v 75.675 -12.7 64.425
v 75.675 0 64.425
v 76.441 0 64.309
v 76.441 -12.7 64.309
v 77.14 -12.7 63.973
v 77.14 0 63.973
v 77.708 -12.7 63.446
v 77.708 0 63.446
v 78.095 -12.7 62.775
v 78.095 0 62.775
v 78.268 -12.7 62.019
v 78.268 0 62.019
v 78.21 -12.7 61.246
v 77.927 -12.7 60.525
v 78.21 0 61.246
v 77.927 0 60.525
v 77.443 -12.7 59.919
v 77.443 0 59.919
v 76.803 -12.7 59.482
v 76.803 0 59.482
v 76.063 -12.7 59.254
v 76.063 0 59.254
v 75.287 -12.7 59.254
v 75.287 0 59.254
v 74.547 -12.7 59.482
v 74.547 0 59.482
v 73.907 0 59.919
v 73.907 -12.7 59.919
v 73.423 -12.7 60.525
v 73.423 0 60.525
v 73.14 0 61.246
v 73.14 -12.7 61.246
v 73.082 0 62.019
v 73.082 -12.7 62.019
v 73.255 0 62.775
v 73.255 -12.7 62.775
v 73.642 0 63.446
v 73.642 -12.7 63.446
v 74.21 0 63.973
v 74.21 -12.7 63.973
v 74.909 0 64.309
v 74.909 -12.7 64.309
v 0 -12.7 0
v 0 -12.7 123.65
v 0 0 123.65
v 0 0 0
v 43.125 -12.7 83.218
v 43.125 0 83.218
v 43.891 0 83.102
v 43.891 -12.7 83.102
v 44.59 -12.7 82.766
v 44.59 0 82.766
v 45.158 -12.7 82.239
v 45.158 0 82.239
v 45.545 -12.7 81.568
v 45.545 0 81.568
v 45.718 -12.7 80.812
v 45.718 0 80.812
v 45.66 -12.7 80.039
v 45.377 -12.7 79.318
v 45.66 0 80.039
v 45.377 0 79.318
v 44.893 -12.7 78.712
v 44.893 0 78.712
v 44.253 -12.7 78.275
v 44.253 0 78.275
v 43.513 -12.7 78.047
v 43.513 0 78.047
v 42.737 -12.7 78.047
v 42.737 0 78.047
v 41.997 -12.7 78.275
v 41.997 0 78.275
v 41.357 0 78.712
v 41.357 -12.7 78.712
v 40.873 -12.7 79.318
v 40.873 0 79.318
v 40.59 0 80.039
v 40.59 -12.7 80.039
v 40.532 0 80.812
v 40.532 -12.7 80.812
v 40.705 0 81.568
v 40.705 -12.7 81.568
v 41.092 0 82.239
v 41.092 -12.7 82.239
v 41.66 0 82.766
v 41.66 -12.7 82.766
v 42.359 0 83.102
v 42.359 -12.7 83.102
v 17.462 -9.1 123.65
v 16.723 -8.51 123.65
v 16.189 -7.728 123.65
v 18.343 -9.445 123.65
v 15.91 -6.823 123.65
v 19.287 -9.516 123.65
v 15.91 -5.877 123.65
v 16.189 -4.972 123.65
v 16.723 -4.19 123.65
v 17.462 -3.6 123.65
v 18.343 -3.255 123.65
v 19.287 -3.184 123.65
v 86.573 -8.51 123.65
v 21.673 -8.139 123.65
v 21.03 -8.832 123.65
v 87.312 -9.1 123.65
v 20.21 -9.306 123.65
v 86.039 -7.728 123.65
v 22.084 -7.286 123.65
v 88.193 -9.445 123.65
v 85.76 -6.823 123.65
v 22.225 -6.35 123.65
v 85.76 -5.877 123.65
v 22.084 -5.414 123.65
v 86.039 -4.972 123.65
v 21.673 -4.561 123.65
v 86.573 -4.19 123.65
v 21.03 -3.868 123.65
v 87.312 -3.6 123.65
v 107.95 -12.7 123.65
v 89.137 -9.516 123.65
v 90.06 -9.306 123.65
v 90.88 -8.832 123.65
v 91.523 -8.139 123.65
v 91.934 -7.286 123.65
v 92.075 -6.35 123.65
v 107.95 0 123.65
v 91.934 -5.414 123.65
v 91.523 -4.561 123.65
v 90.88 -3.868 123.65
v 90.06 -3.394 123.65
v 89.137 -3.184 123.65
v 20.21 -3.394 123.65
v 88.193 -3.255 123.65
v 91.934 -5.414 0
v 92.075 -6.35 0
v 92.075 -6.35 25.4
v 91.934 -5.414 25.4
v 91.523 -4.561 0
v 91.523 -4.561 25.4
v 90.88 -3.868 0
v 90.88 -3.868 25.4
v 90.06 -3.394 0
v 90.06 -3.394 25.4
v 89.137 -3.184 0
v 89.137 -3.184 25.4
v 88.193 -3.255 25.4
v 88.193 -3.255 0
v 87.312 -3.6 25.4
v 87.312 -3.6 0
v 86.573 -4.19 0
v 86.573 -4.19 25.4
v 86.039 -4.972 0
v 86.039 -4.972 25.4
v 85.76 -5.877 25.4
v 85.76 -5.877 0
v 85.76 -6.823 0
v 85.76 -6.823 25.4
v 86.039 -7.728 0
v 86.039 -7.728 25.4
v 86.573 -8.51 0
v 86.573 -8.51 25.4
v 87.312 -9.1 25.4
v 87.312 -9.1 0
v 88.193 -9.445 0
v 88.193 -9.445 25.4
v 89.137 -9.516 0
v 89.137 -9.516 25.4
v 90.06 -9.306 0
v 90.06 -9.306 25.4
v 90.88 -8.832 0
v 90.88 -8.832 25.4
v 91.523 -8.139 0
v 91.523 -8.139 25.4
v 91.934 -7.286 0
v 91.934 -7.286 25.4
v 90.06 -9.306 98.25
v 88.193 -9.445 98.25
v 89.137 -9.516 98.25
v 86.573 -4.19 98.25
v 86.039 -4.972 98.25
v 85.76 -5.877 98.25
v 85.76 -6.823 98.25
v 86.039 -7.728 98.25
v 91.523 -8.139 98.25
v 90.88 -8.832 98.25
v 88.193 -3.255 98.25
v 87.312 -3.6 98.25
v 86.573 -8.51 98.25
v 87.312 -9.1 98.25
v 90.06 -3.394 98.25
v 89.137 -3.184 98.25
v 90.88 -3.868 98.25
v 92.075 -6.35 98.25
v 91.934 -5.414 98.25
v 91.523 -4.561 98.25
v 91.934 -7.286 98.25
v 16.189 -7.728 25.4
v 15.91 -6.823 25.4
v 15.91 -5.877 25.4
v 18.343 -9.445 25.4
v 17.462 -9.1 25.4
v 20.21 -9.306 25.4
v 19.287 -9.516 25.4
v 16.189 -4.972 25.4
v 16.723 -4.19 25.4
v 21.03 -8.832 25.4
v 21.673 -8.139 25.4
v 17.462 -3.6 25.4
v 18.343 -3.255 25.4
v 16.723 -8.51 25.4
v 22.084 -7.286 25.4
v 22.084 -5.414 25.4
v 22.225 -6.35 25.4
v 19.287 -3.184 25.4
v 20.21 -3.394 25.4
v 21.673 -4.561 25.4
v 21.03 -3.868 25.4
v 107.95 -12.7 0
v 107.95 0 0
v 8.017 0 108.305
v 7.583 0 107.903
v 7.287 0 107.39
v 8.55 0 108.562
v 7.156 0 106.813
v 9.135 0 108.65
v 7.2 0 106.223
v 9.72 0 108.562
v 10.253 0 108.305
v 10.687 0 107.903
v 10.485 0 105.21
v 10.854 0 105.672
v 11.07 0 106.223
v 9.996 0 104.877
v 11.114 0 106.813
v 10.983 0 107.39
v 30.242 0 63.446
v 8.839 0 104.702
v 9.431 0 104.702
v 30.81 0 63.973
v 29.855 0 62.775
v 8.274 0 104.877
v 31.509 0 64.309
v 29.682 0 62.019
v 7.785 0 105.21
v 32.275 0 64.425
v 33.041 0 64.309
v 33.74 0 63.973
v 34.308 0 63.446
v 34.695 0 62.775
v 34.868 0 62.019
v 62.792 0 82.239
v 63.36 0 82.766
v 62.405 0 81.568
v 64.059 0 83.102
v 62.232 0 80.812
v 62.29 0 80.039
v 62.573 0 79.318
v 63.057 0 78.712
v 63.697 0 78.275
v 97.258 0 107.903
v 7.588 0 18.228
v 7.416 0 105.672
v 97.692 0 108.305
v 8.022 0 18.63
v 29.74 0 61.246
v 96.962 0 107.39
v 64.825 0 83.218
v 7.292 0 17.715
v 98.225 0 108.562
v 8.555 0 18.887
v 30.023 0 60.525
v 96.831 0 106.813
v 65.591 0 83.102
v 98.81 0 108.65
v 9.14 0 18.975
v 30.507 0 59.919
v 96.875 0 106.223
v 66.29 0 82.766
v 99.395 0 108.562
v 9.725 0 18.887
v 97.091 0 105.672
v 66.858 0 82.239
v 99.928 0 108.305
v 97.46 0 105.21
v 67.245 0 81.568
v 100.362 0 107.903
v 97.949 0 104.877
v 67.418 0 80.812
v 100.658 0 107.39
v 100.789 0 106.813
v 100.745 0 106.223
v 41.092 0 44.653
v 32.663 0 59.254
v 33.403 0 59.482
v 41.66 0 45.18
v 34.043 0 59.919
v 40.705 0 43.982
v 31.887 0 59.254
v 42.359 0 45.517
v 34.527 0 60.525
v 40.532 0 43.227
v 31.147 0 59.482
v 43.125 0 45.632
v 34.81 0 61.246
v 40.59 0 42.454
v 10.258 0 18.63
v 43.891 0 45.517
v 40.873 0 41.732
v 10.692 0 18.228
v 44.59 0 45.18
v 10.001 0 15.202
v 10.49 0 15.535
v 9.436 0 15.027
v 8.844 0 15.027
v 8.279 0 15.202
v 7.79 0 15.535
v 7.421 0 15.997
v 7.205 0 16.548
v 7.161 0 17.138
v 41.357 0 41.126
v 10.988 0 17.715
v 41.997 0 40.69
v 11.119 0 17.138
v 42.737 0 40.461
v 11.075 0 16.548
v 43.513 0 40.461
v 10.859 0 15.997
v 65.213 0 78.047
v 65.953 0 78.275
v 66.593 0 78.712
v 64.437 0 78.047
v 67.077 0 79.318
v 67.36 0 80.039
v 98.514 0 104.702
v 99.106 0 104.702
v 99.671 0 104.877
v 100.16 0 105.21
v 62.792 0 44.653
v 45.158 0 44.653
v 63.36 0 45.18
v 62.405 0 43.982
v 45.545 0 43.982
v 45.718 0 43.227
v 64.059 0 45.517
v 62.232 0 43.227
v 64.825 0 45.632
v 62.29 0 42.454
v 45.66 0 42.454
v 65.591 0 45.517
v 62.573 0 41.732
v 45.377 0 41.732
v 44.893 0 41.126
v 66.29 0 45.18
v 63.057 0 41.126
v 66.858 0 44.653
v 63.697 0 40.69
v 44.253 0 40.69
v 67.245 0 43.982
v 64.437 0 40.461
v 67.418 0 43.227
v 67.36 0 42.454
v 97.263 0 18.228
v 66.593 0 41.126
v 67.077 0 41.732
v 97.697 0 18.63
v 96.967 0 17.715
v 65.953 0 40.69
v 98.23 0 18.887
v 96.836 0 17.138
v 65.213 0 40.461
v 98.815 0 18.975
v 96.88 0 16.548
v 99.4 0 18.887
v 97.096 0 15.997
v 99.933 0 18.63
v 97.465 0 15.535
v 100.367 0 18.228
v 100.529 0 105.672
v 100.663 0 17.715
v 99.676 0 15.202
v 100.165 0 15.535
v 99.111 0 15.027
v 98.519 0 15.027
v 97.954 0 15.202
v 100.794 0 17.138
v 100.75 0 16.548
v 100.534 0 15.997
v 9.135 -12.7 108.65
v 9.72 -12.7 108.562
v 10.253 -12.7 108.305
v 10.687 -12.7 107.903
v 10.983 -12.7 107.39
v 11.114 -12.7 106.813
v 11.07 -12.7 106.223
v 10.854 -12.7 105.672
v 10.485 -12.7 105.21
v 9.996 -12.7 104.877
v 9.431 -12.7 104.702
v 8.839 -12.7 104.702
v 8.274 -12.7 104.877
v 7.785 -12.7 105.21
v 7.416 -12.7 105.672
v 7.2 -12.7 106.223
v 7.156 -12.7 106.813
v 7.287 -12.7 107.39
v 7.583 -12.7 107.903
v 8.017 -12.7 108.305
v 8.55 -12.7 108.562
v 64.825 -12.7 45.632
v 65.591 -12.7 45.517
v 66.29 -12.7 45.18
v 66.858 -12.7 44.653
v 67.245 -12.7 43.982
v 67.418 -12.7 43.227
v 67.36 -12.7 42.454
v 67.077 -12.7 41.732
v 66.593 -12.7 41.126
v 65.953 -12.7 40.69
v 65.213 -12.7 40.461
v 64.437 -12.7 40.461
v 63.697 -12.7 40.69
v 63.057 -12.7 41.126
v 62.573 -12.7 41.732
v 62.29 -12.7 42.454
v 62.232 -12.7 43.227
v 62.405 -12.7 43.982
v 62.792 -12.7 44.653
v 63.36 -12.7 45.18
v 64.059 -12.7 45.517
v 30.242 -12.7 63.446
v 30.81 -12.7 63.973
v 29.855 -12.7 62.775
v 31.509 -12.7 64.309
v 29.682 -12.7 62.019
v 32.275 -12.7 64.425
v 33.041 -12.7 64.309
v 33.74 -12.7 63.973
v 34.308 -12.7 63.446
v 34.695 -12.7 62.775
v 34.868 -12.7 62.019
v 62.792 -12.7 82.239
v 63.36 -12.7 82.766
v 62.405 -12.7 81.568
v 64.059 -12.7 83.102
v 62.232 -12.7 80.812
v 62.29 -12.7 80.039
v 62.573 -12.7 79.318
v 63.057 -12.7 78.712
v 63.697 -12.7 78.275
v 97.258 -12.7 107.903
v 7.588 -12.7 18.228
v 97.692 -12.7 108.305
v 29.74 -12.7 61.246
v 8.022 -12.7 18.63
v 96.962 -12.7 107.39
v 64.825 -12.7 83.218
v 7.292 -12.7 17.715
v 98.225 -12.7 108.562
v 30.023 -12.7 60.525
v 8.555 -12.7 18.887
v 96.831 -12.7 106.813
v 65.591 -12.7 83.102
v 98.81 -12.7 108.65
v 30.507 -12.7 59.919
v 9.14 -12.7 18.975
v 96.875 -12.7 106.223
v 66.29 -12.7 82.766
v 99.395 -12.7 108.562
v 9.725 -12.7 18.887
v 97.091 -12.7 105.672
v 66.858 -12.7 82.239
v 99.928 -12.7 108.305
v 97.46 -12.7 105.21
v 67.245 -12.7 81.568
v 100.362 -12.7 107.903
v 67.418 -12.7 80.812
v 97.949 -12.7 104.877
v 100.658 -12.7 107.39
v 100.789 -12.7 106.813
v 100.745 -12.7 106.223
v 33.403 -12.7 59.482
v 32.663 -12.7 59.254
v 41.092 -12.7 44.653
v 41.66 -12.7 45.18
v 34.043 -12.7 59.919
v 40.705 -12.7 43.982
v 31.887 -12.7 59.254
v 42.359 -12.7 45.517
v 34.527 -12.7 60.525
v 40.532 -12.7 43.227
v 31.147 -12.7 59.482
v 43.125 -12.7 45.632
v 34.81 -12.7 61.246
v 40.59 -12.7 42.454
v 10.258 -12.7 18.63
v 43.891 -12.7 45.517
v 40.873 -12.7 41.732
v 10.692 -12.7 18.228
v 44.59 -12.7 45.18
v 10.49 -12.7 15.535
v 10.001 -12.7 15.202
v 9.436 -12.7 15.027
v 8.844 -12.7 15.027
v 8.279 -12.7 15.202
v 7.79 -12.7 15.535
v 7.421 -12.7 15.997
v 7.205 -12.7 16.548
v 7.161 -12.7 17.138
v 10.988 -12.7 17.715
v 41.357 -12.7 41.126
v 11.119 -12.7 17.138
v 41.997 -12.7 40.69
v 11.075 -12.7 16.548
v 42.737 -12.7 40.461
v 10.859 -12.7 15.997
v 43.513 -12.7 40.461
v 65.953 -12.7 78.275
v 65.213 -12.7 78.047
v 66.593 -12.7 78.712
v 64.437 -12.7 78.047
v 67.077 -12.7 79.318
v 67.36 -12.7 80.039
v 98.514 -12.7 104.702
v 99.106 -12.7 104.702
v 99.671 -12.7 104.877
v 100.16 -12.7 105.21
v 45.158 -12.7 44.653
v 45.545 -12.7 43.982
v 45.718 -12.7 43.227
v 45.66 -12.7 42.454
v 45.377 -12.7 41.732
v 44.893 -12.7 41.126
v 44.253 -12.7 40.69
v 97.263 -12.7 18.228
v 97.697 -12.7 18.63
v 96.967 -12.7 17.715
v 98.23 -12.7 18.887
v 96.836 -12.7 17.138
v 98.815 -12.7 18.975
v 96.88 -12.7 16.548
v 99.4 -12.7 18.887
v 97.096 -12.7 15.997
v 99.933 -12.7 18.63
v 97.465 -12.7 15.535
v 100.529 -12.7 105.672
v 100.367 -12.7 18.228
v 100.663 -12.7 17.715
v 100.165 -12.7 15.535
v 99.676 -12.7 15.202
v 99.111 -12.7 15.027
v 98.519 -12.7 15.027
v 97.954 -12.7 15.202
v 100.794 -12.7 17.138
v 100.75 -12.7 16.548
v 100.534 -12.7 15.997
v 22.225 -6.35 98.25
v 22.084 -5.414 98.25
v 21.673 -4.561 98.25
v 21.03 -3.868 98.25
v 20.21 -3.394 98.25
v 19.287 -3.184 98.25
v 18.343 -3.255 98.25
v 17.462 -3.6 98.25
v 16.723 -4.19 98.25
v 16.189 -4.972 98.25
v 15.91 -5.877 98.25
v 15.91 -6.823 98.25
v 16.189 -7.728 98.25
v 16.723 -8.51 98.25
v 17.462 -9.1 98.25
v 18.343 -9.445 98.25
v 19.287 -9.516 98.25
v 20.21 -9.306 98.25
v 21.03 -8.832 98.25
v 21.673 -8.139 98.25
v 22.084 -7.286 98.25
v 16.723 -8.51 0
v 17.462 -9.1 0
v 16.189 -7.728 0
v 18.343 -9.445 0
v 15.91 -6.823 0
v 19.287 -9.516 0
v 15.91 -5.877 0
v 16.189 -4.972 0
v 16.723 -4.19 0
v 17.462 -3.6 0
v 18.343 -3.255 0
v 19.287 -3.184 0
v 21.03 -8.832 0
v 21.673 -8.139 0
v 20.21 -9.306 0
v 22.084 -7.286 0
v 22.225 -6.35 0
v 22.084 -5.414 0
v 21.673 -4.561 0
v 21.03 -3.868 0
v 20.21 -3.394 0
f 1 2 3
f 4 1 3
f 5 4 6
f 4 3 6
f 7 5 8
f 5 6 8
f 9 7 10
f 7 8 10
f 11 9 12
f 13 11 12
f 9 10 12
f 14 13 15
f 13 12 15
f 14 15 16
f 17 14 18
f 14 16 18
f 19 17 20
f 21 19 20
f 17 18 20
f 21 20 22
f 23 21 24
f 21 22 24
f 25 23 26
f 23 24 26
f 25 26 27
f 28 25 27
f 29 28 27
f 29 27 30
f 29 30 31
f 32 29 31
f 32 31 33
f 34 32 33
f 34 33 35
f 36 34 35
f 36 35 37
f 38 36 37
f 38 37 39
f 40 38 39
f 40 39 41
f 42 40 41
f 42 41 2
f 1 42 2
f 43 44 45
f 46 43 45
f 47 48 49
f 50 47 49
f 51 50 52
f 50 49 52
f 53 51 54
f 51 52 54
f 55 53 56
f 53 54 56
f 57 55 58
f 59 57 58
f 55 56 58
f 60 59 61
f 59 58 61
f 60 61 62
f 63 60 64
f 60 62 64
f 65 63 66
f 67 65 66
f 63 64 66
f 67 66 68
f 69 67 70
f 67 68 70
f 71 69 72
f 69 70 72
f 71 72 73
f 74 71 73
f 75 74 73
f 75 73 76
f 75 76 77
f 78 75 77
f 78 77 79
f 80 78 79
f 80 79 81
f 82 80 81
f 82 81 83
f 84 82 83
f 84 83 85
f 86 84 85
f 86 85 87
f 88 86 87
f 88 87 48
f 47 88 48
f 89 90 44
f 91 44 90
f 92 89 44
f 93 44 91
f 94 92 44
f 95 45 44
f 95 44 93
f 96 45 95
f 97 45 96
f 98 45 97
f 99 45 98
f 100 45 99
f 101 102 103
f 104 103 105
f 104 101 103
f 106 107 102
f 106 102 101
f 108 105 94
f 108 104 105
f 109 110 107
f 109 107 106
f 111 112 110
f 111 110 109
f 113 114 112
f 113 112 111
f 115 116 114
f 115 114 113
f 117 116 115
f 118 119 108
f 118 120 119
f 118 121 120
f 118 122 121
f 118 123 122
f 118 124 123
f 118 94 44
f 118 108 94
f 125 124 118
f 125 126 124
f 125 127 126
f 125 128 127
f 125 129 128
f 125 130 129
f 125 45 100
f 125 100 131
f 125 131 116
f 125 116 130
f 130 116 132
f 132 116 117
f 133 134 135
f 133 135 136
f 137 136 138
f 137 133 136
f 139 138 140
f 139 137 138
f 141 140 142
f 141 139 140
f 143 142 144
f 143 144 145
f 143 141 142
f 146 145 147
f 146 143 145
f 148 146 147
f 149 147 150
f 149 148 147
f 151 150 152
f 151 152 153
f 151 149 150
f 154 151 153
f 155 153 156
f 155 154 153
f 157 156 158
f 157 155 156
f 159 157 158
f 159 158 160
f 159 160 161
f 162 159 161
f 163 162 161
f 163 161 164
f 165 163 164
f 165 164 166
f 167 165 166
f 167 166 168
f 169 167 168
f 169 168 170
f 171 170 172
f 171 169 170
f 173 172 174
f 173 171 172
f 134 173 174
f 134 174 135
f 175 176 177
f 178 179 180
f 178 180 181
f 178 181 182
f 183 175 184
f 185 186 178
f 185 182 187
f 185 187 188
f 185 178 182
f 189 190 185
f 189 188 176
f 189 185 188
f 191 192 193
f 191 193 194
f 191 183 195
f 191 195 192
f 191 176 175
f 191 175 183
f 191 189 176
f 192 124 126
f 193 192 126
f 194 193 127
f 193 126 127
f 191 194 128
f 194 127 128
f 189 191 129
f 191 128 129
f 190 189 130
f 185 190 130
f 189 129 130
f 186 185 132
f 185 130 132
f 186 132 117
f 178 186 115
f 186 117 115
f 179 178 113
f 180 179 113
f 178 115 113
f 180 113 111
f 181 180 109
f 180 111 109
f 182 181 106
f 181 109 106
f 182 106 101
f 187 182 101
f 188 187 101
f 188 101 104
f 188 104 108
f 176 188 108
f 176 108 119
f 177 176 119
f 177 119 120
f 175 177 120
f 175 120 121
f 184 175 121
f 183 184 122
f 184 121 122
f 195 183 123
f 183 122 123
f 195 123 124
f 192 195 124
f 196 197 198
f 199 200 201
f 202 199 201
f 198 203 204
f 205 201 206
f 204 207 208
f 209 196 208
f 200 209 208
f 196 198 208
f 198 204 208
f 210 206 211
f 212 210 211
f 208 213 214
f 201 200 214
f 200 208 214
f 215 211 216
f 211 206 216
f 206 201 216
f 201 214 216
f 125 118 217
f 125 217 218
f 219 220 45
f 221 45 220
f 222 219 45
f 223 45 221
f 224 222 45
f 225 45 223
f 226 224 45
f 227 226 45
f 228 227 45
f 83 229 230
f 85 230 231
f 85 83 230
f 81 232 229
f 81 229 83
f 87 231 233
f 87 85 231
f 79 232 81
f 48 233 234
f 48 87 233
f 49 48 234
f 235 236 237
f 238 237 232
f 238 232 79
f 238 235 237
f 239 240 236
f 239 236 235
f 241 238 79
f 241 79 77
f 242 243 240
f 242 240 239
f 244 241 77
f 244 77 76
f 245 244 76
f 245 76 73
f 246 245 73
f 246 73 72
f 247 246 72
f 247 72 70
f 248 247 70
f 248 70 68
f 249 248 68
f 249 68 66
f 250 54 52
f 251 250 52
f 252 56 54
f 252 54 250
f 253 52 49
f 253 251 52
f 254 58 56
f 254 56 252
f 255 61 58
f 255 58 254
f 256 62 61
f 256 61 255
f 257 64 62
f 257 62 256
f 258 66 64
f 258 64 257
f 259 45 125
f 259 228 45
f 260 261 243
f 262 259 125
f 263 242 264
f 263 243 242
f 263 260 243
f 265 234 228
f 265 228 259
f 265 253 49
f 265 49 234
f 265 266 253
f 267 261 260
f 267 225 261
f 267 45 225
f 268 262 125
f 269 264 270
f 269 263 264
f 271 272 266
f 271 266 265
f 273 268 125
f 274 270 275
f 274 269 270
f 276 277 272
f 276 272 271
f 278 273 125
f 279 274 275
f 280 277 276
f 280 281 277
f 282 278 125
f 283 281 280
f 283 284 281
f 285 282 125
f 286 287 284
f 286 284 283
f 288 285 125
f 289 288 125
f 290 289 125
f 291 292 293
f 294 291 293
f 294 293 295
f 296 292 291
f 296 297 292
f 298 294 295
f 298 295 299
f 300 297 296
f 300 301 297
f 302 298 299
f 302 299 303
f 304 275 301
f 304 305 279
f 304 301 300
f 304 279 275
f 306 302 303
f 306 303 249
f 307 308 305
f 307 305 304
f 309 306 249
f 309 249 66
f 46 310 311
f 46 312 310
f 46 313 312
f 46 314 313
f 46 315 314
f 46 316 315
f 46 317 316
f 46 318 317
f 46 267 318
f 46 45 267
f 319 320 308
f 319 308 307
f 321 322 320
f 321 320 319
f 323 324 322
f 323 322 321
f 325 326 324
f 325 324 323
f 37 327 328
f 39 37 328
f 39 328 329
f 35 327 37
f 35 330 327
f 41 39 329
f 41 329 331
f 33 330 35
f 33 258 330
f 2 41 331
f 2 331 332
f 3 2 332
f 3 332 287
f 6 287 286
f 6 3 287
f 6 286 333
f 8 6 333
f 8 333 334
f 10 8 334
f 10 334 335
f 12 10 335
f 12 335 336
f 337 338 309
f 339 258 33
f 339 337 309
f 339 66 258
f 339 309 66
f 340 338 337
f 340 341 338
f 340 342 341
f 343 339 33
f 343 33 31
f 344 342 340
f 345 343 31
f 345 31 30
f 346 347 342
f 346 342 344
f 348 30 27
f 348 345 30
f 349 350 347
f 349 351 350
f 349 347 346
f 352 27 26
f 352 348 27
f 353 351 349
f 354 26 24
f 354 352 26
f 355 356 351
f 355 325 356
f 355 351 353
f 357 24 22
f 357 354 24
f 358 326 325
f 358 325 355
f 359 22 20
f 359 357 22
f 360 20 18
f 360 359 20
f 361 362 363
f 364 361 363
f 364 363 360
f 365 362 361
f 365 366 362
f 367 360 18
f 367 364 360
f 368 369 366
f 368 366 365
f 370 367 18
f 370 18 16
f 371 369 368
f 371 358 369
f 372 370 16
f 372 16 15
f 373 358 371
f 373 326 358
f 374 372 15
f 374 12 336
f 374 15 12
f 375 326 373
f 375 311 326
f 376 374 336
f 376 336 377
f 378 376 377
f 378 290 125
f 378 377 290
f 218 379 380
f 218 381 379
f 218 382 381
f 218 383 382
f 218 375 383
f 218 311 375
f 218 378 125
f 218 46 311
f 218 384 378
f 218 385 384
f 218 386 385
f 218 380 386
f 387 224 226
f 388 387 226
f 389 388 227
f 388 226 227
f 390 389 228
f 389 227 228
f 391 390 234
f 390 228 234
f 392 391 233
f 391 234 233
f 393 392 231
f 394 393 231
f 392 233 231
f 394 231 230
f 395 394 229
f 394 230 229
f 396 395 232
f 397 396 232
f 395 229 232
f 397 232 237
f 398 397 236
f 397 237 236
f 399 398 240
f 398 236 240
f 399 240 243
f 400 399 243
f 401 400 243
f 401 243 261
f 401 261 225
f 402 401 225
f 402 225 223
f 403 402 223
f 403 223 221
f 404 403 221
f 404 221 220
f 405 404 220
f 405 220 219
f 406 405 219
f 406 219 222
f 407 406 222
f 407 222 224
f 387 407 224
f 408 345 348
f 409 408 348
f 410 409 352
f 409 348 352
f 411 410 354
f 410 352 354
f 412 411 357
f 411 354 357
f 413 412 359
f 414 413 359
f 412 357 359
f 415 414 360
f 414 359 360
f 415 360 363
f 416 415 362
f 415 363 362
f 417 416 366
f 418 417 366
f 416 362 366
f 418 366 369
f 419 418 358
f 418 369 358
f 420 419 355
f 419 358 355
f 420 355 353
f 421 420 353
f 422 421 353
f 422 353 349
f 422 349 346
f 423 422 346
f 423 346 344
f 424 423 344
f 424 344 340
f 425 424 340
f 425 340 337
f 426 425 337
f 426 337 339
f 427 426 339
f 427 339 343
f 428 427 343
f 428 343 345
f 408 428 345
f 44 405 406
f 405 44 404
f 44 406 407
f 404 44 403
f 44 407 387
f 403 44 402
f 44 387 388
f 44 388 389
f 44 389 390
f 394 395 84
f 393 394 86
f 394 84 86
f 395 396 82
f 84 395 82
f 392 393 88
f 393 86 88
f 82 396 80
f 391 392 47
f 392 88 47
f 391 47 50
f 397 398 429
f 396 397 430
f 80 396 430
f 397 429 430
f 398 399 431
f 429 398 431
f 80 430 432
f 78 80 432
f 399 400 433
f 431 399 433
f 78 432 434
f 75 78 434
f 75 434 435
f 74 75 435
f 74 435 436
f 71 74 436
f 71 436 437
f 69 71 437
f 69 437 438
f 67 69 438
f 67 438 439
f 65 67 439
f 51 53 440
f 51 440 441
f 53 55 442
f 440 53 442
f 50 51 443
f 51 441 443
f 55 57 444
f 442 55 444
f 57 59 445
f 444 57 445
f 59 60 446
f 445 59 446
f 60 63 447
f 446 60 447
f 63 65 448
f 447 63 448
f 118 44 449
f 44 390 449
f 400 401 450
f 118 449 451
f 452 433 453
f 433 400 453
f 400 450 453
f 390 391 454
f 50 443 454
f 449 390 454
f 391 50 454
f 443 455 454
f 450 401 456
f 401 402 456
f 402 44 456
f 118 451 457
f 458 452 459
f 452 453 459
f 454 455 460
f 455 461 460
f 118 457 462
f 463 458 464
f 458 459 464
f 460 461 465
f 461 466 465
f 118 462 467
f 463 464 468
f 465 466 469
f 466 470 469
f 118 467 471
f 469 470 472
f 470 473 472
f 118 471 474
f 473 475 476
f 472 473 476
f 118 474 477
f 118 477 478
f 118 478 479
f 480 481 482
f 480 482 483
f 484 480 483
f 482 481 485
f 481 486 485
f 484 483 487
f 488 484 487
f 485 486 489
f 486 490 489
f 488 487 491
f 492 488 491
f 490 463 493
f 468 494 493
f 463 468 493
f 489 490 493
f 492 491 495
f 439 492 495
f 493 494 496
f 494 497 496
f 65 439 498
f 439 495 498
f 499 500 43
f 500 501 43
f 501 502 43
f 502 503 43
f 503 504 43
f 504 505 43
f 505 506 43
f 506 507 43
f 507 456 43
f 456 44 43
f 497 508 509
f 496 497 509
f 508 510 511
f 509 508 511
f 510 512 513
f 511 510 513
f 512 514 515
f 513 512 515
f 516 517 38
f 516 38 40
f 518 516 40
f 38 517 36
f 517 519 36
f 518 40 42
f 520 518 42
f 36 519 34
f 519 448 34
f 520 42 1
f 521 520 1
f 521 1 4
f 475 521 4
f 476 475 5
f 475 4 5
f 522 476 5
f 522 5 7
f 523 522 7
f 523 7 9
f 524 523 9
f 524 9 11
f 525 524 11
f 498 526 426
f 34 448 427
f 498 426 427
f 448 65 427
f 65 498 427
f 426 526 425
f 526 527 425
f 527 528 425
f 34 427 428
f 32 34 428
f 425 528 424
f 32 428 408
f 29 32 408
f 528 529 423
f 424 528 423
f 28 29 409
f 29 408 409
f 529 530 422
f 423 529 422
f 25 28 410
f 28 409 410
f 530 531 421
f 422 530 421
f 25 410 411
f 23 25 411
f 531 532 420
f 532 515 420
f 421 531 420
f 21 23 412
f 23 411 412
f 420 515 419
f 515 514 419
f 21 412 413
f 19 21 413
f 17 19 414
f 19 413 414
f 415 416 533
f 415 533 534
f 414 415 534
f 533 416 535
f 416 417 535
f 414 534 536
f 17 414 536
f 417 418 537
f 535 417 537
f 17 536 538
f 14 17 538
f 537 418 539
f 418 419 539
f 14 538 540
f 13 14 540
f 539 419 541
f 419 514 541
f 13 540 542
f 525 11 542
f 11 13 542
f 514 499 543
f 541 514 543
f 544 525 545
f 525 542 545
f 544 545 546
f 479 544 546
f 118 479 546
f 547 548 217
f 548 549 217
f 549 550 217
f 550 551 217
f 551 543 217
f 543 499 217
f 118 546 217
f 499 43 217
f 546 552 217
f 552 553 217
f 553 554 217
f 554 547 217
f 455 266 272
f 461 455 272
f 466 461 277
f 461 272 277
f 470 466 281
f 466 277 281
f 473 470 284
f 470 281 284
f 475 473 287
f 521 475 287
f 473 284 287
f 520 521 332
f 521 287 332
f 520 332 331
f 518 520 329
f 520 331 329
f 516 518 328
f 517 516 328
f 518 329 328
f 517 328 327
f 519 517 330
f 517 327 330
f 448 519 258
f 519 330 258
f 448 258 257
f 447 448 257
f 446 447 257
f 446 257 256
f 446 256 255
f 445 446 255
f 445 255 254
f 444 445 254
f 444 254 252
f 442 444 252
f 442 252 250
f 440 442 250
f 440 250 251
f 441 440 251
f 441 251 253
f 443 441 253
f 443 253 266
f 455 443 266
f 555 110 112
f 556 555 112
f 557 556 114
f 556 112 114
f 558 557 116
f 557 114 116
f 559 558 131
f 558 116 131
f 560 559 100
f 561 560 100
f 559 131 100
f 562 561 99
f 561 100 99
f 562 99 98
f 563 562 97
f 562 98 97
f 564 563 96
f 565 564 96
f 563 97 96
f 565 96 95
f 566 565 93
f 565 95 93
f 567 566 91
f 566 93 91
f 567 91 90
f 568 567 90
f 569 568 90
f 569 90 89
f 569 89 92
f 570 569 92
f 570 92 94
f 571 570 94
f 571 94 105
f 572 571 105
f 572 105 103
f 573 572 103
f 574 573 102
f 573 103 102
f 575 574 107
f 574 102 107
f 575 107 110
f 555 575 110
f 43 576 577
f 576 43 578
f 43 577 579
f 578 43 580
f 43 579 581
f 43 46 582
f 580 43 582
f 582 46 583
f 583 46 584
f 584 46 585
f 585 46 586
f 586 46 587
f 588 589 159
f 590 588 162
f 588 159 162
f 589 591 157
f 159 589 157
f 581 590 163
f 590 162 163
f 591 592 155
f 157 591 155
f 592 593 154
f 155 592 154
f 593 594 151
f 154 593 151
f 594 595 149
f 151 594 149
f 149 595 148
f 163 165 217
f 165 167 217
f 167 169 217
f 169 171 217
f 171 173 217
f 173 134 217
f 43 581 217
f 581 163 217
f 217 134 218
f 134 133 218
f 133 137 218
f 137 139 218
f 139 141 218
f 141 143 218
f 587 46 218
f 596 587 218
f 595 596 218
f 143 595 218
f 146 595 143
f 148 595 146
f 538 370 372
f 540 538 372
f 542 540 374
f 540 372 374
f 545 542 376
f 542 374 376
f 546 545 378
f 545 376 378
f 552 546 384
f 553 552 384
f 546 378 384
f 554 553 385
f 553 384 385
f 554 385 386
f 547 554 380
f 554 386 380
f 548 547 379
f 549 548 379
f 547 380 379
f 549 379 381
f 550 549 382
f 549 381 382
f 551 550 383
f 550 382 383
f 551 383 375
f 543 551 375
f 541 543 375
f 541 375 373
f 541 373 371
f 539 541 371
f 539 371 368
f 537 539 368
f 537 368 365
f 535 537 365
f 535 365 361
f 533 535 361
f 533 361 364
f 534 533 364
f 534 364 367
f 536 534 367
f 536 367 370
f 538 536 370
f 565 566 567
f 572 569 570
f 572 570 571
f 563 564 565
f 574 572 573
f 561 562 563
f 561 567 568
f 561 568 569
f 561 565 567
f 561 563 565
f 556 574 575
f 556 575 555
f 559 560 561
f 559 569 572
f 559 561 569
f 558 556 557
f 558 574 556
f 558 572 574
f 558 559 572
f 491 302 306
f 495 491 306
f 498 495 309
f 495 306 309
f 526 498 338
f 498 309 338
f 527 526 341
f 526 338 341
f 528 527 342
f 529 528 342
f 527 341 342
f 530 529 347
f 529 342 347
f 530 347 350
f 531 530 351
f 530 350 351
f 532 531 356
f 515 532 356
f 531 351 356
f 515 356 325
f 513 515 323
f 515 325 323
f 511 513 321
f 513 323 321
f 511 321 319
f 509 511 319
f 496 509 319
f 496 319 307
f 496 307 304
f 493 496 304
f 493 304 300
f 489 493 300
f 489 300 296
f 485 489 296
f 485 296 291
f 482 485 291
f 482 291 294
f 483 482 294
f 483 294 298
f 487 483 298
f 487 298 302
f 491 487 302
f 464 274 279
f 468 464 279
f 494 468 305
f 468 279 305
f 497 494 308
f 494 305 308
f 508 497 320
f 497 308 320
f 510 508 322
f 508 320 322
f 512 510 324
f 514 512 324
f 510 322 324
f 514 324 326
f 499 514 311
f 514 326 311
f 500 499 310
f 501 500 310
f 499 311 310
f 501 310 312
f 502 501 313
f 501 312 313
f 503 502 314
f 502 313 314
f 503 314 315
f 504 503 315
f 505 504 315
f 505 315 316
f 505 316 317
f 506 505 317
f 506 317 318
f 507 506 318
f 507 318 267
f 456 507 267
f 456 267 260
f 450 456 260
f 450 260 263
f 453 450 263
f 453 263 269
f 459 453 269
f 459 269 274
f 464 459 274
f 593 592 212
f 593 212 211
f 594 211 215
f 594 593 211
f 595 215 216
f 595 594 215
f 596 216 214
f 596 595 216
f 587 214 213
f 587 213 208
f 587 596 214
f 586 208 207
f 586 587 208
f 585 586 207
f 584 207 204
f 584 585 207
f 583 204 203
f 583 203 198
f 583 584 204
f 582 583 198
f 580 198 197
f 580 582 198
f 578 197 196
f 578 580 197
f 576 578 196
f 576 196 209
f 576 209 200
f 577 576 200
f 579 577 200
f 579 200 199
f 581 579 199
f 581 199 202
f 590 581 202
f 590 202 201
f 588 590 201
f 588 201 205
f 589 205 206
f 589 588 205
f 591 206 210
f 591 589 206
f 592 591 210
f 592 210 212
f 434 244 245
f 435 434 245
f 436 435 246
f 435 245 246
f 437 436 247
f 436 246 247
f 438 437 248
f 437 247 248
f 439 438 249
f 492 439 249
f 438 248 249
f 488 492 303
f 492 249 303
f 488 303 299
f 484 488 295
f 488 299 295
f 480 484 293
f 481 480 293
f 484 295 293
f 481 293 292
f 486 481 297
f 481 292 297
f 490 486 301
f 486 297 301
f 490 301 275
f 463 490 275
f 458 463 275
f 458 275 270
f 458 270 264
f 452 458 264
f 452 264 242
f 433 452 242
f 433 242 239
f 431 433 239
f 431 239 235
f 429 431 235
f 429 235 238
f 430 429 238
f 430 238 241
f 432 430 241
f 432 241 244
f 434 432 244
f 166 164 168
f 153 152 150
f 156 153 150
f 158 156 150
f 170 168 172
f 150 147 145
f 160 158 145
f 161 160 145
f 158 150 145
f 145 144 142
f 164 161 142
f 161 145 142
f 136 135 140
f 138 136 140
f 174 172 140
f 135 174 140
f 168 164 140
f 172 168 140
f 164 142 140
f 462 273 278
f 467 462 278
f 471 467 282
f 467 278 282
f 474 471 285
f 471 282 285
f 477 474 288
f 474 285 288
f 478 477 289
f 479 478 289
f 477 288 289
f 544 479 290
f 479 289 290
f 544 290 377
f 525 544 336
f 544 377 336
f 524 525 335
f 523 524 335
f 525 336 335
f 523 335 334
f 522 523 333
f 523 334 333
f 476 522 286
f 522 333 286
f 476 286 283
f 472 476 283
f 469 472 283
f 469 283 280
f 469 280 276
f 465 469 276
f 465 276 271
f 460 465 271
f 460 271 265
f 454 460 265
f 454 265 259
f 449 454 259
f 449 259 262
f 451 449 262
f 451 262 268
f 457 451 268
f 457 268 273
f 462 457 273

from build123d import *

# Parameters (mm, degrees)
SKETCH1_W           = 107.95
SKETCH1_H           = 12.7
BOSS_EXTRUDE1_DEPTH = 123.65
SKETCH2_R           = 3.175
CUT_EXTRUDE1_DEPTH  = 25.4
SKETCH4_R           = 1.985
CUT_EXTRUDE3_DEPTH  = 165.632363161
SKETCH6_R           = 2.6
CUT_EXTRUDE8_DEPTH  = 165.632363161


with BuildPart() as part:
    # Sketch1 → Boss-Extrude1 (new body)
    with BuildSketch(Plane.XY):
        with Locations((53.975, -6.35)):
            Rectangle(SKETCH1_W, SKETCH1_H)
    extrude(amount=BOSS_EXTRUDE1_DEPTH)

    # Sketch2 → Cut-Extrude1 (cut)
    with BuildSketch(Plane.XY.offset(123.65)):
        with Locations((19.05, -6.35)):
            Circle(SKETCH2_R)
        with Locations((88.9, -6.35)):
            Circle(SKETCH2_R)
    cut_extrude1 = extrude(amount=-CUT_EXTRUDE1_DEPTH, mode=Mode.SUBTRACT)

    # Mirror1: Cut-Extrude1 across plane
    add(cut_extrude1.mirror(Plane.XY.offset(61.825)), mode=Mode.SUBTRACT)

    # Sketch4 → Cut-Extrude3 (cut, through all)
    with BuildSketch(Plane(origin=(0, 0, 0), x_dir=(1, 0, 0), z_dir=(0, 1, 0))):
        with Locations(Location((9.135, -106.665, 0), (0, 0, 270))):
            Circle(SKETCH4_R)
        with Locations(Location((9.14, -16.99, 0), (0, 0, 270))):
            Circle(SKETCH4_R)
        with Locations(Location((98.81, -106.665, 0), (0, 0, 270))):
            Circle(SKETCH4_R)
        with Locations(Location((98.815, -16.99, 0), (0, 0, 270))):
            Circle(SKETCH4_R)
    extrude(amount=-CUT_EXTRUDE3_DEPTH, mode=Mode.SUBTRACT)

    # Sketch6 → Cut-Extrude8 (cut, through all)
    with BuildSketch(Plane(origin=(0, 0, 0), x_dir=(1, 0, 0), z_dir=(0, 1, 0))):
        with Locations(Location((32.275, -61.825, 0), (0, 0, 270))):
            Circle(SKETCH6_R)
        with Locations(Location((43.125, -43.032248738, 0), (0, 0, 270))):
            Circle(SKETCH6_R)
        with Locations(Location((64.825, -43.032248738, 0), (0, 0, 270))):
            Circle(SKETCH6_R)
        with Locations(Location((75.675, -61.825, 0), (0, 0, 270))):
            Circle(SKETCH6_R)
        with Locations(Location((64.825, -80.617751262, 0), (0, 0, 270))):
            Circle(SKETCH6_R)
        with Locations(Location((43.125, -80.617751262, 0), (0, 0, 270))):
            Circle(SKETCH6_R)
    extrude(amount=-CUT_EXTRUDE8_DEPTH, mode=Mode.SUBTRACT)


solid = part.part
